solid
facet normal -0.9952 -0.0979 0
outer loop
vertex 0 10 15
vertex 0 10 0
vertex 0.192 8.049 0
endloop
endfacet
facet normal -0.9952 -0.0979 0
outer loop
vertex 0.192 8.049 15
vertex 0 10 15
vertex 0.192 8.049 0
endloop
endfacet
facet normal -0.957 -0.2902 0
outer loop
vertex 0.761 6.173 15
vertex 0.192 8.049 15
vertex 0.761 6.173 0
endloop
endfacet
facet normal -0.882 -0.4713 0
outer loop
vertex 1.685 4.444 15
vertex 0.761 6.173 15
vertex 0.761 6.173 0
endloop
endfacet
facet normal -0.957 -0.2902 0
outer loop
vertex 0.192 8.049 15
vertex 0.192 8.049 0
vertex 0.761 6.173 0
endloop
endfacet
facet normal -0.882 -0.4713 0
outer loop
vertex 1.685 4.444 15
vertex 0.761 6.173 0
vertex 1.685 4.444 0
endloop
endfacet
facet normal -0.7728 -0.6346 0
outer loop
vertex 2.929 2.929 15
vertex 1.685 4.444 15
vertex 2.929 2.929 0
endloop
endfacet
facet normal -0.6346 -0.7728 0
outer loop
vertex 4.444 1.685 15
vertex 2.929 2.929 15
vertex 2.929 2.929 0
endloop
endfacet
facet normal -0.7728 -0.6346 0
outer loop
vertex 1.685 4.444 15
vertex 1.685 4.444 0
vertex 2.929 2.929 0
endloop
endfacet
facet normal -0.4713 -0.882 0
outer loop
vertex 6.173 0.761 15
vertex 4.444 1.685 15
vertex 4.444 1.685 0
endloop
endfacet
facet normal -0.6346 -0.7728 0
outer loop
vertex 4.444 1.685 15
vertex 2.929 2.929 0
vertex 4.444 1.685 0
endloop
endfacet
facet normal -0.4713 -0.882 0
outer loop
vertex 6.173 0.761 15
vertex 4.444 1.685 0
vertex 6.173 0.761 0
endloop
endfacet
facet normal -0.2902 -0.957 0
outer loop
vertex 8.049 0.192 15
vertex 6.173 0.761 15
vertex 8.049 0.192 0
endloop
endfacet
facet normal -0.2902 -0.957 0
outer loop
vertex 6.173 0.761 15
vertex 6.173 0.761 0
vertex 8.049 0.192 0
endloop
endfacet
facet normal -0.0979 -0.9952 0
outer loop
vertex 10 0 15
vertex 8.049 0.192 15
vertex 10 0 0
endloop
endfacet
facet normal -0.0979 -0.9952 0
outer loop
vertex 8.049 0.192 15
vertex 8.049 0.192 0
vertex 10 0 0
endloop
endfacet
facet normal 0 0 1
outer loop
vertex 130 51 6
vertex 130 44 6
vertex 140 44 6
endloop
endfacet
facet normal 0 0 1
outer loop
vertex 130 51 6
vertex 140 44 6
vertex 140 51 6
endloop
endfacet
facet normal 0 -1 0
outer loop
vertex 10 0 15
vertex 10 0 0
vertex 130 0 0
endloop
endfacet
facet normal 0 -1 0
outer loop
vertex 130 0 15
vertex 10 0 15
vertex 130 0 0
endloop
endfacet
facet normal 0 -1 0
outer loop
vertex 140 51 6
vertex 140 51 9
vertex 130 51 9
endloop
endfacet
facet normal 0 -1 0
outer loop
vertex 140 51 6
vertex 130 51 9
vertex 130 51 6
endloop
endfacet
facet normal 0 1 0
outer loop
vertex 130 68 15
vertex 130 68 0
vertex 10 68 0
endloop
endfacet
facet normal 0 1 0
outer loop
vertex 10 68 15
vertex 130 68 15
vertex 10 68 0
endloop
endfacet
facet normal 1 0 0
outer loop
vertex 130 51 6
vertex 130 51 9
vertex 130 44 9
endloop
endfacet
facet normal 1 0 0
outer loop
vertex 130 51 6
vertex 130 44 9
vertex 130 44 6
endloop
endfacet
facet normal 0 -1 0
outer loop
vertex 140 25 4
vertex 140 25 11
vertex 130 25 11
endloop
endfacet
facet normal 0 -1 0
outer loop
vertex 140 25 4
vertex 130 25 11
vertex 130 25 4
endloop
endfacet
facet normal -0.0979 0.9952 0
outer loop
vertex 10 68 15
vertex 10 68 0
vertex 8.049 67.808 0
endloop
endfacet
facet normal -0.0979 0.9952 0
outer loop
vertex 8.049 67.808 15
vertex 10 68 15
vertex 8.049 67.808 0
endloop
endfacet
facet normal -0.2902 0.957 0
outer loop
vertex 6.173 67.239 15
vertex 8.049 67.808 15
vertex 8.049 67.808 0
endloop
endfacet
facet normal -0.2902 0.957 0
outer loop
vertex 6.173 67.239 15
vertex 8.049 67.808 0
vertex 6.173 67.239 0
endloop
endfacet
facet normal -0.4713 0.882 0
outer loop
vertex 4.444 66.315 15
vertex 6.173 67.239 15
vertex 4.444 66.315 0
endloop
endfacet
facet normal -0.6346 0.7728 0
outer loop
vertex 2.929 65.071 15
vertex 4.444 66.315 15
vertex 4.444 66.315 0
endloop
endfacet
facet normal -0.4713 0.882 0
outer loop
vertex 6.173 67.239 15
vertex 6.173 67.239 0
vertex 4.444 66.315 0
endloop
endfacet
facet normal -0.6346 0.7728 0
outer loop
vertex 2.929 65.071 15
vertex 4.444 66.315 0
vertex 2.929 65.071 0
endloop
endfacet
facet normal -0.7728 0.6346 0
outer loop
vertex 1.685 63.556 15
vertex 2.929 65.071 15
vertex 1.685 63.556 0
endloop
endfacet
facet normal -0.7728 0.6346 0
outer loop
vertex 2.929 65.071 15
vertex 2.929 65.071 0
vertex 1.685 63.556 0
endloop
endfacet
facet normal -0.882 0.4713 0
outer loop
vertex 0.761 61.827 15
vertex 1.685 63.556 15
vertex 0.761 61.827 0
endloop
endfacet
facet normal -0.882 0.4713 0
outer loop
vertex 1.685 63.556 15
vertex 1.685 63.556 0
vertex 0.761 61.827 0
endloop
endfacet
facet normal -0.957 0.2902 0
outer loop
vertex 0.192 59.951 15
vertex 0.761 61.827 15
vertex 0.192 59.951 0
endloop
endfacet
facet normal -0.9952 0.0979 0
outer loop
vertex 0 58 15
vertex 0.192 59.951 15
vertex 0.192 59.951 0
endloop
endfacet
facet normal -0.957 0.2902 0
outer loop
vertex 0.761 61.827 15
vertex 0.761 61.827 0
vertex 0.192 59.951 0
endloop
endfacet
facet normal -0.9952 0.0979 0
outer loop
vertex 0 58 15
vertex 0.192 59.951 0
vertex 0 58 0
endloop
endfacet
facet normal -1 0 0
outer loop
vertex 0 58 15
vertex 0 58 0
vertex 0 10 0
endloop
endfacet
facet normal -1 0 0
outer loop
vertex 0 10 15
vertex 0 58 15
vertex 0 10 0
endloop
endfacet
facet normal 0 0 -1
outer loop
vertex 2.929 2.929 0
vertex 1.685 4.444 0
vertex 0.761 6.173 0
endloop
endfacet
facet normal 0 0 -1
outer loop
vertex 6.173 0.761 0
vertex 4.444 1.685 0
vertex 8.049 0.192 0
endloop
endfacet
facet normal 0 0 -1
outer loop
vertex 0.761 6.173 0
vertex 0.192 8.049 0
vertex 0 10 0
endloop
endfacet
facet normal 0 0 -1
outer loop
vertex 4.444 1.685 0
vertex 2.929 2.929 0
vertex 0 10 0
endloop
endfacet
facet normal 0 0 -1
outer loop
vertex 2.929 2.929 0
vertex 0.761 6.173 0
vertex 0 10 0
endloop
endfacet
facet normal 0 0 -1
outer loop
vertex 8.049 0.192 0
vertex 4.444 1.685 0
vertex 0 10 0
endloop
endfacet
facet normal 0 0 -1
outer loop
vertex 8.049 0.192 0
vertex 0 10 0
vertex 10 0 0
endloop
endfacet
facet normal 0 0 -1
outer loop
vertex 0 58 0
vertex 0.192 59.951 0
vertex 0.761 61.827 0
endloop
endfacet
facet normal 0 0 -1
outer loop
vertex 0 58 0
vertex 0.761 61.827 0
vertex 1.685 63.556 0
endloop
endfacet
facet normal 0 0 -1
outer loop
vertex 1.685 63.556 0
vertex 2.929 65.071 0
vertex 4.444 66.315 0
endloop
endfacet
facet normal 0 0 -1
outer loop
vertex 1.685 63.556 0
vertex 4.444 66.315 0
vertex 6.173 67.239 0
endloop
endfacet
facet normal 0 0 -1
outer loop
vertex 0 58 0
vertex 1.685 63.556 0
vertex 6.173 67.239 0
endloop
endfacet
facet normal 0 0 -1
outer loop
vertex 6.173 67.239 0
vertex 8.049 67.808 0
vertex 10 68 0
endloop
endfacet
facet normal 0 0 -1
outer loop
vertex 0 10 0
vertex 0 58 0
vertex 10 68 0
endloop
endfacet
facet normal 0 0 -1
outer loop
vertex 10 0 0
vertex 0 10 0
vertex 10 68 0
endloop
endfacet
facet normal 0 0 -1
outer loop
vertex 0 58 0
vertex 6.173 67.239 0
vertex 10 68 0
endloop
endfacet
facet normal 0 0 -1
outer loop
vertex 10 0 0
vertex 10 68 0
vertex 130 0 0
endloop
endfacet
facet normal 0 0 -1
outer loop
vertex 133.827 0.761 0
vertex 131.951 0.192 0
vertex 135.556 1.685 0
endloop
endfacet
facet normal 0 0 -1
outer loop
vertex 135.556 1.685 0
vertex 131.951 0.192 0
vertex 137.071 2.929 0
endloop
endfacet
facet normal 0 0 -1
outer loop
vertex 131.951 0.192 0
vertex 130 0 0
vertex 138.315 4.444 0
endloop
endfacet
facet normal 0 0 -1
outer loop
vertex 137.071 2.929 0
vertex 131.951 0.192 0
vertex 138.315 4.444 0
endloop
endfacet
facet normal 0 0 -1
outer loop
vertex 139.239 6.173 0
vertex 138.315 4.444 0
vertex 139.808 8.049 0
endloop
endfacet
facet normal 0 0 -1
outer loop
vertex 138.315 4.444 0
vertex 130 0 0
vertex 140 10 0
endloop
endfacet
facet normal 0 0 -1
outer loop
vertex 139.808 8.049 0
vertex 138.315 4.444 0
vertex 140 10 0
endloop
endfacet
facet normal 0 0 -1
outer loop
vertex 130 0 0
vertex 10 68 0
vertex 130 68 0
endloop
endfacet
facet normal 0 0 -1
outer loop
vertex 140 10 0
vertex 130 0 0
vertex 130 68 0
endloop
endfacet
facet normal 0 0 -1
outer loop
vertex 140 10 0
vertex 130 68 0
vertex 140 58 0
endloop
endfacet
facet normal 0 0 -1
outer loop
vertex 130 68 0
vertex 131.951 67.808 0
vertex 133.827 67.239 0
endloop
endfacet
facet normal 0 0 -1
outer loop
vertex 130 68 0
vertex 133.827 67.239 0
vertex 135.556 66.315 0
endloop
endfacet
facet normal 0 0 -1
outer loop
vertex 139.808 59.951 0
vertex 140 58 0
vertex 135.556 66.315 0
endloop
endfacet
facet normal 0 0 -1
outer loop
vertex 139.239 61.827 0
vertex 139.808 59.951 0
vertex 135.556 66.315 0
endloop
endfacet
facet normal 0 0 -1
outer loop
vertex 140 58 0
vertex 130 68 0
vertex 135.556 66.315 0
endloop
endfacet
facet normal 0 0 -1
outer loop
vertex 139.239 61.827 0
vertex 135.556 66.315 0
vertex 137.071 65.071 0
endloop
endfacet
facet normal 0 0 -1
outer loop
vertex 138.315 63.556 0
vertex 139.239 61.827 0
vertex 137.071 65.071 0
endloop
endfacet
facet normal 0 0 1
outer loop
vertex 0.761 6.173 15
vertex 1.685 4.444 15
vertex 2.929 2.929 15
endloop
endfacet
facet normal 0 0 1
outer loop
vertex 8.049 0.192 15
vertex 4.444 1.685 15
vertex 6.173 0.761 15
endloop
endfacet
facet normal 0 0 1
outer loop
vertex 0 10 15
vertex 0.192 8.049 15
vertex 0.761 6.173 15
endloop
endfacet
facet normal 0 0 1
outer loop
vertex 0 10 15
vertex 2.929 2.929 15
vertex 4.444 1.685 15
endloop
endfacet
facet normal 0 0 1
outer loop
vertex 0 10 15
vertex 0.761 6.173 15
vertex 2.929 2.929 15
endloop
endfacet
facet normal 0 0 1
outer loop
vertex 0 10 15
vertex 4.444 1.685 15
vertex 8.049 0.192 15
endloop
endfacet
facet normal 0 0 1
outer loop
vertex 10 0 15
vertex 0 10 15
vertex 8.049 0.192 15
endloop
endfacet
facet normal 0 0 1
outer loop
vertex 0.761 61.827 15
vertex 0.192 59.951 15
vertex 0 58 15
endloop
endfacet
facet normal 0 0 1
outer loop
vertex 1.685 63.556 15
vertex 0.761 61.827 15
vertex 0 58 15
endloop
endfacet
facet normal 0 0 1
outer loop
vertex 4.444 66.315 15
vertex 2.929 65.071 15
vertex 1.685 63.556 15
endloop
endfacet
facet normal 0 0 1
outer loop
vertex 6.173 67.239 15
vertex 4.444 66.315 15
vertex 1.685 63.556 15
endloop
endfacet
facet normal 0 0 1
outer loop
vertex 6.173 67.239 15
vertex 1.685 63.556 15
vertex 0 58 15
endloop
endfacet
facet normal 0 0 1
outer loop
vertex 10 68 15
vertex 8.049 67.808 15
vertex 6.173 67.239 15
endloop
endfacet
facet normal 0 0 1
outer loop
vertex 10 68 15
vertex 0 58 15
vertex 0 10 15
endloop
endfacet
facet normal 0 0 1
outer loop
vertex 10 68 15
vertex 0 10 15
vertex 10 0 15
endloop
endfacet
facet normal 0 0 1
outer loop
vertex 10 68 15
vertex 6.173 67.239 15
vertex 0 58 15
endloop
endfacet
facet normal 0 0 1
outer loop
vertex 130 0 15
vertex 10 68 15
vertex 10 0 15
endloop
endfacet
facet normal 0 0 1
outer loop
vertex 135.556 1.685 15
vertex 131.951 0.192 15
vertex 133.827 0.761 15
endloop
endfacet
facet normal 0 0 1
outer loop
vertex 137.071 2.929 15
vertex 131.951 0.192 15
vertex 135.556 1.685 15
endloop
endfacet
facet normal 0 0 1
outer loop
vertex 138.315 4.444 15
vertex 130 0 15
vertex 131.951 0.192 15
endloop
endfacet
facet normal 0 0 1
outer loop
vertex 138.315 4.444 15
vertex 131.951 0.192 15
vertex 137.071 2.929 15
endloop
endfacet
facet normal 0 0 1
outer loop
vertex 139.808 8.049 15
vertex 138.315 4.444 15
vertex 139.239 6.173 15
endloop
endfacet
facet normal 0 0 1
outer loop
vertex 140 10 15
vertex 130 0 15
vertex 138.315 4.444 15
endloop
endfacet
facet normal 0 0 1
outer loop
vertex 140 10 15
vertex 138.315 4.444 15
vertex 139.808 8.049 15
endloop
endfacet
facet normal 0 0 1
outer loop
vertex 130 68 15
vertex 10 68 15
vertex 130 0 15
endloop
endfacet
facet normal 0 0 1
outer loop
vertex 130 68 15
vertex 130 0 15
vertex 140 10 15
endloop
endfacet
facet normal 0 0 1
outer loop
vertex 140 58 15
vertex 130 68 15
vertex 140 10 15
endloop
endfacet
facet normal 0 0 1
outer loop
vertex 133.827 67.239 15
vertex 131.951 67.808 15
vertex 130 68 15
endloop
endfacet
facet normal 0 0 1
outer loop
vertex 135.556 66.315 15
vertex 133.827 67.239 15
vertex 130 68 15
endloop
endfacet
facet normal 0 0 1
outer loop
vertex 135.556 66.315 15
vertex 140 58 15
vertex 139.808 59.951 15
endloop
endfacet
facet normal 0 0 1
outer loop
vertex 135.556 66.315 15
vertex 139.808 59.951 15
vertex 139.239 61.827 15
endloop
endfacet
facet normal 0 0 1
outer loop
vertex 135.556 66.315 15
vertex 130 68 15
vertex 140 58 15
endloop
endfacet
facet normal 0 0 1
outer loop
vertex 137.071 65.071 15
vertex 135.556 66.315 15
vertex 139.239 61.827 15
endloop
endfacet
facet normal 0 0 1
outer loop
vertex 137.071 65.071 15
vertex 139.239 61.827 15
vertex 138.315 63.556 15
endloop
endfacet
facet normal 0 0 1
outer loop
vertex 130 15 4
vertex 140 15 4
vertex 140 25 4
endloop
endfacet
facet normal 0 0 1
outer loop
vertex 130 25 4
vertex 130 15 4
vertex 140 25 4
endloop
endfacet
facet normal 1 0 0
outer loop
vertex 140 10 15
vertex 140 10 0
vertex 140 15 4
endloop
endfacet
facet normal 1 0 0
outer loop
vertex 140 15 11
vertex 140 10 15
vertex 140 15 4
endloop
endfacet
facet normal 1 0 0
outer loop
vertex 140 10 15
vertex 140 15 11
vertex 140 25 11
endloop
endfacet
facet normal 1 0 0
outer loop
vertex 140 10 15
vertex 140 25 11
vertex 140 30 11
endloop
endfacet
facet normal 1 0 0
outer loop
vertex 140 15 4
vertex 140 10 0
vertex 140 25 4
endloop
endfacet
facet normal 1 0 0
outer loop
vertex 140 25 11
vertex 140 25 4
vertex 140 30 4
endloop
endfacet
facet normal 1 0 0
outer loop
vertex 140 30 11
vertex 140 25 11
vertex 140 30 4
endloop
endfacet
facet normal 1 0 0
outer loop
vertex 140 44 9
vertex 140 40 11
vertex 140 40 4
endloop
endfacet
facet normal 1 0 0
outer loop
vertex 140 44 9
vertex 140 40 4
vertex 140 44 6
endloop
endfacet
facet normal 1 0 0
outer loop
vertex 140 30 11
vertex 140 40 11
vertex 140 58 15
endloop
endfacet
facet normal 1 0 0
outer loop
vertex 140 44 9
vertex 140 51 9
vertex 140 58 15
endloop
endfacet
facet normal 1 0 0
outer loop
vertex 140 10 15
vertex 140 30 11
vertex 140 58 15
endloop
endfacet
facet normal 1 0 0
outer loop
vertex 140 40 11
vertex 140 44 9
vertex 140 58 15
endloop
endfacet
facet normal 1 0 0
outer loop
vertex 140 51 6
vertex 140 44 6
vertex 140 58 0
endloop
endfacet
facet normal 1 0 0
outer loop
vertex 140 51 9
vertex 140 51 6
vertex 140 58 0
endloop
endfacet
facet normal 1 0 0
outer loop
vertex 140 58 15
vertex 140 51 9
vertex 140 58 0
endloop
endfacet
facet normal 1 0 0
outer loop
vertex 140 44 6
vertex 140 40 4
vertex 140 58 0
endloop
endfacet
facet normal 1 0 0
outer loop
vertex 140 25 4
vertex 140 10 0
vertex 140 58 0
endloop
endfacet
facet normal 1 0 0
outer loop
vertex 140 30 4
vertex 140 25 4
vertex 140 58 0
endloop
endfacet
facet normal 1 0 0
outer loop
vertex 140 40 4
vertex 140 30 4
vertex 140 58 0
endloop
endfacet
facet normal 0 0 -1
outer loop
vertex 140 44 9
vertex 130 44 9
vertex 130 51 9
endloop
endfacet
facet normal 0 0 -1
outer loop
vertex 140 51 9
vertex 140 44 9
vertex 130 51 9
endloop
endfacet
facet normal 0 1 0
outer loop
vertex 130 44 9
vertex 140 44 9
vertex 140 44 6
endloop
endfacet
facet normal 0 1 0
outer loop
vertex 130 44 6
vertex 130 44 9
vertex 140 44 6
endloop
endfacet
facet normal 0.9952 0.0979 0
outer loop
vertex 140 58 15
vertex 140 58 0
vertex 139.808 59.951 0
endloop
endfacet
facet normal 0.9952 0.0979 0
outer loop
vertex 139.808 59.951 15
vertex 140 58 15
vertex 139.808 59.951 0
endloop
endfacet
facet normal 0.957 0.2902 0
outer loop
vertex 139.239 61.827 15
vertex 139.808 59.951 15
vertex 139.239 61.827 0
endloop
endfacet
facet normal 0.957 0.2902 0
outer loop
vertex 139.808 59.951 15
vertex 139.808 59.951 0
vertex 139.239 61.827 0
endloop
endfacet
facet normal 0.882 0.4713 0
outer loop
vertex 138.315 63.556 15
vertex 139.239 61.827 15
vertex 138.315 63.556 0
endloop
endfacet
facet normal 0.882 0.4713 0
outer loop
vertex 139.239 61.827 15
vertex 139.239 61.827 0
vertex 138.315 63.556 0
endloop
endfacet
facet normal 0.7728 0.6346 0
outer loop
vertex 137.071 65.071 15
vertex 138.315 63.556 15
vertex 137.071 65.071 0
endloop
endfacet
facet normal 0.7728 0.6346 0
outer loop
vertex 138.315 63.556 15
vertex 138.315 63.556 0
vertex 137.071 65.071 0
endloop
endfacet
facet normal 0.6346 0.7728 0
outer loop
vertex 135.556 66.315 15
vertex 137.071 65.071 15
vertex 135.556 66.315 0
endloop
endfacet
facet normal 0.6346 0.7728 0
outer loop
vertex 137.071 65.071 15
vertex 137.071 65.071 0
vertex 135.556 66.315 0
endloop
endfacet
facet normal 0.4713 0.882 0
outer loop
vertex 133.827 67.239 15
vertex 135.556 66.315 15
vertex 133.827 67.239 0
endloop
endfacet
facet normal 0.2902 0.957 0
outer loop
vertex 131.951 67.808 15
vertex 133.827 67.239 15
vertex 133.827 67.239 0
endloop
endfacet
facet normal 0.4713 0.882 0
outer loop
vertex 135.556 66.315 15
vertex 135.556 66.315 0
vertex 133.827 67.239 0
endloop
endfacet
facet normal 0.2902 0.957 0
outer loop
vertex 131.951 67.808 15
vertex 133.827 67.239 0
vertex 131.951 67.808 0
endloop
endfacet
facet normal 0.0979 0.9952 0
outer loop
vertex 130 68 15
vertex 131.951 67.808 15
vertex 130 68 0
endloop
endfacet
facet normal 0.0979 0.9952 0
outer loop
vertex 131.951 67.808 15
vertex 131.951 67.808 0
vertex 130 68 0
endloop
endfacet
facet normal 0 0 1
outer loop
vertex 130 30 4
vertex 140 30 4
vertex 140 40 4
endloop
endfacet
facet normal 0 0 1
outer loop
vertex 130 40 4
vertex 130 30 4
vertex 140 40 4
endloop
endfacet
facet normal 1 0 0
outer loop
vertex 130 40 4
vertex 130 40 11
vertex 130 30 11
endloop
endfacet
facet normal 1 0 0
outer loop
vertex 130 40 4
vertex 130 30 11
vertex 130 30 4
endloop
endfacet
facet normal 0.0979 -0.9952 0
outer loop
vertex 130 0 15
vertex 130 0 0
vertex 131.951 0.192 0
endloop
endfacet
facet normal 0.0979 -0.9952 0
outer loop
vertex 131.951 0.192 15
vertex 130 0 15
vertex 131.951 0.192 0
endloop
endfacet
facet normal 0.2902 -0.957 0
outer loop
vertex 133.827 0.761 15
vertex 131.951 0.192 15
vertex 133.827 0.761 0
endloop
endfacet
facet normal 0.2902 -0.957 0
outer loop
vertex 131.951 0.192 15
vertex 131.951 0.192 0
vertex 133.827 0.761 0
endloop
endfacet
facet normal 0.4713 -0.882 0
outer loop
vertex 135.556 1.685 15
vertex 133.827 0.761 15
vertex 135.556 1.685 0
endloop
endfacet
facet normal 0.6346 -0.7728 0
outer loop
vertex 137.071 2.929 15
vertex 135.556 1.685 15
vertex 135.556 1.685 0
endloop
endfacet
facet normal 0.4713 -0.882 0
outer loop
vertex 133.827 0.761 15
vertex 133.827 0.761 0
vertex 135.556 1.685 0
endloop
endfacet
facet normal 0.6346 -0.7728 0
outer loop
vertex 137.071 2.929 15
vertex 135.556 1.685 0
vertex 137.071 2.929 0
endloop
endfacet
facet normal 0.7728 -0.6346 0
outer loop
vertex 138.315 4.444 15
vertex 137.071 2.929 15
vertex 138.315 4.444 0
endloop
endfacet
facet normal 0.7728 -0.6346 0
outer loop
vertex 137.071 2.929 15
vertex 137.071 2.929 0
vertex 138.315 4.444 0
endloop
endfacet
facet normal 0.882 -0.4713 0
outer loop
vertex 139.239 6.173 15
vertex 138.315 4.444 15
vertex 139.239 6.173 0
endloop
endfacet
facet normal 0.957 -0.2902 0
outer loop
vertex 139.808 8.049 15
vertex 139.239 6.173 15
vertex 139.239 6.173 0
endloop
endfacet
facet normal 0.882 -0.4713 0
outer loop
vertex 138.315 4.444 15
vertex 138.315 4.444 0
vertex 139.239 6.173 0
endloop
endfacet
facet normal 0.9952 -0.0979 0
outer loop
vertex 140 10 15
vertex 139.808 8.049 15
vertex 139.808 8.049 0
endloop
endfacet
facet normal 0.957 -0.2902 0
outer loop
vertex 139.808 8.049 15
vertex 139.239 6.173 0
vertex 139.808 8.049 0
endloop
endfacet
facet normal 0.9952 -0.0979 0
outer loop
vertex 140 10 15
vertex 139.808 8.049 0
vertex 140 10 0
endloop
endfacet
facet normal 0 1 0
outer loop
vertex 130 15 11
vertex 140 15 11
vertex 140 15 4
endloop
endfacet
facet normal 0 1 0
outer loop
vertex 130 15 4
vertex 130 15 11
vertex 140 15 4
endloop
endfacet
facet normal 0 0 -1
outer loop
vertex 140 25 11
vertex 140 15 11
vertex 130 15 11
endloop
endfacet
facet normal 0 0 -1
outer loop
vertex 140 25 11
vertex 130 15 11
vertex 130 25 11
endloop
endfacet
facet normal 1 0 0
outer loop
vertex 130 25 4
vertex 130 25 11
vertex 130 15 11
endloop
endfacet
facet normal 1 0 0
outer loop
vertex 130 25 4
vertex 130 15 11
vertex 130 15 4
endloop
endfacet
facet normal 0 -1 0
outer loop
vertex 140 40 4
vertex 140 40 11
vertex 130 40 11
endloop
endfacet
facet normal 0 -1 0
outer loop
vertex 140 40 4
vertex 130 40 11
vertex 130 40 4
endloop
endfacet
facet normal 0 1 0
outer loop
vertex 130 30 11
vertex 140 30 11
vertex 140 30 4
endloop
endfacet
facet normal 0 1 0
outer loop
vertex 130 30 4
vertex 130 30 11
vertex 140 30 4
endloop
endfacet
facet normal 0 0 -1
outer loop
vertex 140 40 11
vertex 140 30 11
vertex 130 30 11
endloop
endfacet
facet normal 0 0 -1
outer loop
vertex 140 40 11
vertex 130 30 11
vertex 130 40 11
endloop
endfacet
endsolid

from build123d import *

# Parameters (mm, degrees)
Y_KSEKLIK_EKSTR_ZYON1_DEPTH = 15
IZIM2_W                     = 7
IZIM2_H                     = 10
IZIM2_W_2                   = 3
IZIM2_H_2                   = 7
KES_EKSTR_ZYON1_DEPTH       = 10


with BuildPart() as part:
    # Çizim1 → Yükseklik-Ekstrüzyon1 (new body)
    with BuildSketch(Plane.XY):
        with BuildLine():
            Line((10, 0), (130, 0))
            ThreePointArc((130, 0), (137.071067812, 2.928932188), (140, 10))
            Line((140, 10), (140, 58))
            ThreePointArc((140, 58), (137.071067812, 65.071067812), (130, 68))
            Line((130, 68), (10, 68))
            ThreePointArc((10, 68), (2.928932188, 65.071067812), (0, 58))
            Line((0, 58), (0, 10))
            ThreePointArc((0, 10), (2.928932188, 2.928932188), (10, 0))
        make_face()
    extrude(amount=Y_KSEKLIK_EKSTR_ZYON1_DEPTH)

    # Çizim2 → Kes-Ekstrüzyon1 (cut)
    with BuildSketch(Plane(origin=(140, 0, 0), x_dir=(0, 0, -1), z_dir=(1, 0, 0))):
        with Locations((-7.5, 20)):
            Rectangle(IZIM2_W, IZIM2_H)
        with Locations((-7.5, 35)):
            Rectangle(IZIM2_W, IZIM2_H)
        with Locations((-7.5, 47.5)):
            Rectangle(IZIM2_W_2, IZIM2_H_2)
    extrude(amount=-KES_EKSTR_ZYON1_DEPTH, mode=Mode.SUBTRACT)


solid = part.part
